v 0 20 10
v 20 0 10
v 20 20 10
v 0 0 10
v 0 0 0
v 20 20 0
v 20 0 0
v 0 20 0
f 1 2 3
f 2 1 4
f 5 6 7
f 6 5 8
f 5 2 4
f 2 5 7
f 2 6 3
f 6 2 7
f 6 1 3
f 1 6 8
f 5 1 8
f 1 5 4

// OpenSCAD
// Sharp corners but a 20 mm footprint: below the 50 mm advisory floor, no warning.
cube([20, 20, 10]);
